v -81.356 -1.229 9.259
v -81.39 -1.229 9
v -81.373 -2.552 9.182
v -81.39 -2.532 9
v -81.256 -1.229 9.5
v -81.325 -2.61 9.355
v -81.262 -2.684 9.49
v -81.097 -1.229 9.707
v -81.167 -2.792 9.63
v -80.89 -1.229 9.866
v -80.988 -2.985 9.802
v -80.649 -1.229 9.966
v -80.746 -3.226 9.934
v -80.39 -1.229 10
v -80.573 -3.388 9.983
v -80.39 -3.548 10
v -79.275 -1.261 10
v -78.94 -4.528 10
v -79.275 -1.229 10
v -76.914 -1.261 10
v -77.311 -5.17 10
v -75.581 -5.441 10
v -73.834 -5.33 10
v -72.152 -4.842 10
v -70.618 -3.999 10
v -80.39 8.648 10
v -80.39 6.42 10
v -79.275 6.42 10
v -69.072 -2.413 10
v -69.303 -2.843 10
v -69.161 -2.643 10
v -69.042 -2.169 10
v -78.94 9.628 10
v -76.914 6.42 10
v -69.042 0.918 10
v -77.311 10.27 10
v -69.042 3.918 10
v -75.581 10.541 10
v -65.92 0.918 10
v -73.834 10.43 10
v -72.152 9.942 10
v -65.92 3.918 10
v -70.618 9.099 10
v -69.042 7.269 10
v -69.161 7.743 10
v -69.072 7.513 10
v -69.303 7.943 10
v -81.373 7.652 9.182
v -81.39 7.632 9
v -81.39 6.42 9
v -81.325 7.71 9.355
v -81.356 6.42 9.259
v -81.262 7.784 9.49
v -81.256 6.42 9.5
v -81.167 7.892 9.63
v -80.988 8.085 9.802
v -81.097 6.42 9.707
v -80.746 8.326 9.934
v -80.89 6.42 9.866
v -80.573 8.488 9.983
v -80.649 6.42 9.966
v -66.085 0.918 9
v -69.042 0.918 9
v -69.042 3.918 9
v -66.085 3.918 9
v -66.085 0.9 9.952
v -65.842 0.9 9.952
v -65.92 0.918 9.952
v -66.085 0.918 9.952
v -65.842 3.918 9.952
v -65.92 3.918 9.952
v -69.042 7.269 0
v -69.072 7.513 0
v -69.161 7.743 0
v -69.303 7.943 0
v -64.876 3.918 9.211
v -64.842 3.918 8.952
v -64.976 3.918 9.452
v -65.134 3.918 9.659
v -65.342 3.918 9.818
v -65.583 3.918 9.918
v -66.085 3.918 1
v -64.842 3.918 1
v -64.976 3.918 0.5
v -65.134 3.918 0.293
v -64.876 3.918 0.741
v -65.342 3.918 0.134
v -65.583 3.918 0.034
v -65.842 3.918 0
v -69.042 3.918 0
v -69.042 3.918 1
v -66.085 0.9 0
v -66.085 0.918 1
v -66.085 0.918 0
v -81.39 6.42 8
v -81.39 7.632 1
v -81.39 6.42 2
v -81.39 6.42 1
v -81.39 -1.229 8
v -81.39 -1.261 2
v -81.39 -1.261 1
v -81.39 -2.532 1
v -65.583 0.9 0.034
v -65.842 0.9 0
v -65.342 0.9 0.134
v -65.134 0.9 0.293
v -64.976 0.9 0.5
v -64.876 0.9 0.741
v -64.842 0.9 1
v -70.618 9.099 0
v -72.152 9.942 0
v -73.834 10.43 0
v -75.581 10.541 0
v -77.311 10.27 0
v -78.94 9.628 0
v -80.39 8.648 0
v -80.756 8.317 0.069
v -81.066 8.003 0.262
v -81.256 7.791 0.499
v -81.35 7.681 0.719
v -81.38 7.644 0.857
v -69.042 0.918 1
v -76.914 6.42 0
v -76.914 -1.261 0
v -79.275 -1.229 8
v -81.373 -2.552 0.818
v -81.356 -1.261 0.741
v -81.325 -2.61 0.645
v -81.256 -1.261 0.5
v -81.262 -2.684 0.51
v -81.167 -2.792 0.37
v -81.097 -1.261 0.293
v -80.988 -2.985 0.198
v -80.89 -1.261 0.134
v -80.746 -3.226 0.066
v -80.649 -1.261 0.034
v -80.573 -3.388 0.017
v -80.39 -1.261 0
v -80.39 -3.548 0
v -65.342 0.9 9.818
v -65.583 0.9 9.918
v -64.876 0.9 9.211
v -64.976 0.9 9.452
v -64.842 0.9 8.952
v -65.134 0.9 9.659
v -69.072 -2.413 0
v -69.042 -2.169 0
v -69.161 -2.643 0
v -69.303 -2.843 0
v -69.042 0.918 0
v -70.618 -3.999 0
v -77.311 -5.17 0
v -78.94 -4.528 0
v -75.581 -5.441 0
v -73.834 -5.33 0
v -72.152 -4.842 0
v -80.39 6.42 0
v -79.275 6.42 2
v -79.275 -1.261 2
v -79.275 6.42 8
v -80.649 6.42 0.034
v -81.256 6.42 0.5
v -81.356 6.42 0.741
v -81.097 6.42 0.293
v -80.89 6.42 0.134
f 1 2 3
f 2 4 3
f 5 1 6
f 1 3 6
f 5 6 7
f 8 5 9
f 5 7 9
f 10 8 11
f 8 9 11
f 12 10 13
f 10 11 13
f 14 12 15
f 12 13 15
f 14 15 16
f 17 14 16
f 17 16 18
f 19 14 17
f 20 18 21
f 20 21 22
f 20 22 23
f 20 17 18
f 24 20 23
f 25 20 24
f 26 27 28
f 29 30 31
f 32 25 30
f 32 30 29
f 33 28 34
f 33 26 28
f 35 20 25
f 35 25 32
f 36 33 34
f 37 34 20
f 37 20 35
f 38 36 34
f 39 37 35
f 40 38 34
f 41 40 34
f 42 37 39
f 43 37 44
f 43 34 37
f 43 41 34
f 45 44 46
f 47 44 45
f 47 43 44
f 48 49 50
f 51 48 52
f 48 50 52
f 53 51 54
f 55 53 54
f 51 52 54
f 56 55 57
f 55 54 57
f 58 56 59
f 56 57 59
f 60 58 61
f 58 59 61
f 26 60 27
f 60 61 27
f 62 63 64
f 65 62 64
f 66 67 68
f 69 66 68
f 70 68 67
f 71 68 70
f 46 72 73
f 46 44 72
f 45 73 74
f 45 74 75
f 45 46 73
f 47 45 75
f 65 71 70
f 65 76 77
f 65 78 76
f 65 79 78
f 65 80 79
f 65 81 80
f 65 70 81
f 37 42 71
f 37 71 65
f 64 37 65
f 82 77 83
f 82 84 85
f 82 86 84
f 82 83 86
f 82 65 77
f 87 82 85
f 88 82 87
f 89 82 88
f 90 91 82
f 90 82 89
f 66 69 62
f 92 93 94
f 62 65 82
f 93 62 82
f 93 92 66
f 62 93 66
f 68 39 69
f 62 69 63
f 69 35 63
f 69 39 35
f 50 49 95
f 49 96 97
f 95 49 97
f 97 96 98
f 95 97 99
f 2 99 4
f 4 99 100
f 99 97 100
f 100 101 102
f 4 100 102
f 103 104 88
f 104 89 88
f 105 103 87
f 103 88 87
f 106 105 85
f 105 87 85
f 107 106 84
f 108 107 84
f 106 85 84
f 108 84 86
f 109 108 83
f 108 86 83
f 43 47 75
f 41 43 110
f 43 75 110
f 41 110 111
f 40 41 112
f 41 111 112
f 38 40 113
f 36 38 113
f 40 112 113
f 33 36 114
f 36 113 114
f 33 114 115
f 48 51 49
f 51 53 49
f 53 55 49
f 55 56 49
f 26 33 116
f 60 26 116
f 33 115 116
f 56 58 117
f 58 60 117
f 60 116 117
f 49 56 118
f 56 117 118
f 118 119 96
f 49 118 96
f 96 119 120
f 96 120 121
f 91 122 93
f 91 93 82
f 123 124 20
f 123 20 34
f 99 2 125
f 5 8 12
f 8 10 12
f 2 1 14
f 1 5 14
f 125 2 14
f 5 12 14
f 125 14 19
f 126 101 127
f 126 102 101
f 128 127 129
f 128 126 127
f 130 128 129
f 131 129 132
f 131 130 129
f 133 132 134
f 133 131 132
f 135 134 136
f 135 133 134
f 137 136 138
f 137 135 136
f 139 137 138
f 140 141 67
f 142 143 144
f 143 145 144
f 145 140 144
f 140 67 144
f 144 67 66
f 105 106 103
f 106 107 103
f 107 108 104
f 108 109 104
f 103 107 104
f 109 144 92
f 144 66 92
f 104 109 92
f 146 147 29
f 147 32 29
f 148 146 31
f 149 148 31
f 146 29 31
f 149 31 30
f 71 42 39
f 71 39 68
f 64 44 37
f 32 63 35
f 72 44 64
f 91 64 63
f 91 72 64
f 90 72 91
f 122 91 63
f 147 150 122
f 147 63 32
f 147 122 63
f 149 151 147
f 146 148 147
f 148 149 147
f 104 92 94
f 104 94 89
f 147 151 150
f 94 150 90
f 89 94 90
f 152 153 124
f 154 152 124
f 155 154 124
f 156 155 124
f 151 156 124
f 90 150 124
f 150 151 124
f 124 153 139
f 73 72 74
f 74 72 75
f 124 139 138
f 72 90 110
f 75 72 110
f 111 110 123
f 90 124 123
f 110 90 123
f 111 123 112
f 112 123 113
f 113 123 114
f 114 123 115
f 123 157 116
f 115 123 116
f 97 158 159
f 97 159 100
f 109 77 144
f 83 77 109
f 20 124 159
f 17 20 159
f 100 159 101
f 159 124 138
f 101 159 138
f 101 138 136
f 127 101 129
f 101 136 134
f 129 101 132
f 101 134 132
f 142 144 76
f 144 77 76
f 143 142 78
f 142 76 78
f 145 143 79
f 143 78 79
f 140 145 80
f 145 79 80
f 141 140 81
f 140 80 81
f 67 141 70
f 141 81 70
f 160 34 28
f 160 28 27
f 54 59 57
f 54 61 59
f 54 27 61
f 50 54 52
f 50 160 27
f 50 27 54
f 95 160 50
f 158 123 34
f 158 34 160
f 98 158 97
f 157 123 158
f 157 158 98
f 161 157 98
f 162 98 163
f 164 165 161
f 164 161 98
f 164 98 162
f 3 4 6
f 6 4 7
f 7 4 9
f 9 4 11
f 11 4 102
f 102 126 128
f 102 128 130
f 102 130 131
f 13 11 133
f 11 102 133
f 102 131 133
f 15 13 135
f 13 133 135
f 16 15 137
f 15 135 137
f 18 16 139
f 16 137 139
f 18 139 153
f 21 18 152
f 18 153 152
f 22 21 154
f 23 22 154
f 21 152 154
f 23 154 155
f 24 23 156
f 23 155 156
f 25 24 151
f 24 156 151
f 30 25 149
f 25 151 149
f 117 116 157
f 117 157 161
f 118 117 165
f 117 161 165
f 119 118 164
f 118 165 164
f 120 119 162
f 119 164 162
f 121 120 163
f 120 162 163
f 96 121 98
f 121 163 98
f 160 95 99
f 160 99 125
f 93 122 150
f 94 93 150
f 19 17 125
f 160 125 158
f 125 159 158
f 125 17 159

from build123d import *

# Parameters (mm, degrees)
SKETCH_1_R            = 8
EXTRUDE_1_DEPTH       = 10
SKETCH_9_W            = 7.120641766
SKETCH_9_H            = 4.534999238
EXTRUDE_6_DEPTH       = 1
SKETCH_11_W           = 1.257653538
SKETCH_11_H           = 9
EXTRUDE_7_DEPTH       = 4.5
EXTRUDE_8_DEPTH       = 6
FILLET_8_R            = 1
FILLET_9_R            = 1
CUT_EXTRUDE_1_DEPTH   = 10
SKETCH_14_W           = 1
SKETCH_14_H           = 3
EXTRUDE_9_DEPTH       = 3.122043073
SKETCH_15_W           = 1
SKETCH_15_H           = 3
EXTRUDE_10_DEPTH      = 4
EXTRUDE_11_DEPTH      = 0.2
EXTRUDE_11_DEPTH_BACK = 1.043632387
SKETCH_16_W           = 9.952294967
SKETCH_16_H           = 3.01746433
FILLET_11_R           = 1
FILLET_12_R           = 1
FILLET_13_R           = 1
FILLET_14_R           = 1
CUT_EXTRUDE_2_DEPTH   = 10
SKETCH_18_W           = 2.361428176
SKETCH_18_H           = 7.68123899
CUT_EXTRUDE_3_DEPTH   = 10
SKETCH_19_W           = 2.115065294
SKETCH_19_H           = 7.68123899
CUT_EXTRUDE_4_DEPTH   = 2
SKETCH_20_W           = 2.115065294
SKETCH_20_H           = 7.649055087
CUT_EXTRUDE_5_DEPTH   = 2
FILLET_15_R           = 1
FILLET_16_R           = 1
FILLET_17_R           = 1
FILLET_18_R           = 1


with BuildPart() as part:
    # 草圖1 → 填料-伸長1 (new body)
    with BuildSketch(Plane(origin=(0.382706605, 0, 0), x_dir=(1, 0, 0), z_dir=(0, 0, 1))):
        with Locations((-75.594417438, 2.55)):
            Circle(SKETCH_1_R)
    extrude(amount=EXTRUDE_1_DEPTH)

    # 草圖9 → 填料-伸長6 (add)
    with BuildSketch(Plane(origin=(6.127831546, 0, 9), x_dir=(1, 0, 0), z_dir=(0, 0, 1))):
        with Locations((-75.644850643, 2.267499619)):
            Rectangle(SKETCH_9_W, SKETCH_9_H)
    extrude(amount=EXTRUDE_6_DEPTH)



with BuildPart() as body_2:
    # 草圖11 → 填料-伸長7 (new body)
    with BuildSketch(Plane(origin=(9.574526933, 4.534999238, 0.48426017), x_dir=(1, 0, 0), z_dir=(0, 1, 0))):
        with Locations((-76.184774061, -4.5)):
            Rectangle(SKETCH_11_W, SKETCH_11_H)
    extrude(amount=-EXTRUDE_7_DEPTH)


with BuildPart() as part_1:
    add(part.part)

    add(body_2.part)  # 填料-伸長8 merges body 2
    # 草圖12 → 填料-伸長8 (add)
    with BuildSketch(Plane.ZY.offset(67.239073897)):
        Polygon((0.48426017, 4.534999238), (0.48426017, 0), (1.483647509, 0.034999238), (1.483647509, 4.534999238), align=None)
    extrude(amount=EXTRUDE_8_DEPTH)

    # 圓角8
    fillet_8_edges = [part_1.edges().sort_by_distance(p)[0] for p in [
        (-65.981420359, 2.284999238, 0.48426017),
    ]]
    fillet(fillet_8_edges, radius=FILLET_8_R)

    # 圓角9
    fillet_9_edges = [part_1.edges().sort_by_distance(p)[0] for p in [
        (-65.956698214, 2.267499619, 10),
    ]]
    fillet(fillet_9_edges, radius=FILLET_9_R - 0.0001)  # a hair under: the kernel refuses the full size

    # 草圖13 → 除料-伸長1 (cut)
    with BuildSketch(Plane(origin=(0, 0, 0), x_dir=(-1, 0, 0), z_dir=(0, 0, -1))):
        with BuildLine():
            Line((69.041558468, 7.642074214), (69.041558468, -2.542074214))
            ThreePointArc((69.041558468, -2.542074214), (63.949484255, 2.55), (69.041558468, 7.642074214))
        make_face()
    extrude(amount=-CUT_EXTRUDE_1_DEPTH, mode=Mode.SUBTRACT)

    # 草圖14 → 填料-伸長9 (add)
    with BuildSketch(Plane(origin=(-69.041558468, 0, 0), x_dir=(0, 0, -1), z_dir=(1, 0, 0))):
        with Locations((-9.5, 2.417510407)):
            Rectangle(SKETCH_14_W, SKETCH_14_H)
    extrude(amount=EXTRUDE_9_DEPTH)

    # 草圖15 → 填料-伸長10 (add)
    with BuildSketch(Plane(origin=(-69.041558468, 0, 0), x_dir=(0, 0, -1), z_dir=(1, 0, 0))):
        with Locations((-0.5, 2.417510407)):
            Rectangle(SKETCH_15_W, SKETCH_15_H)
    extrude(amount=EXTRUDE_10_DEPTH)

    # 草圖16 → 填料-伸長11 (add, two sides: drawn at the far end of the back side and taken through both)
    with BuildSketch(Plane(origin=(-65.041558468, 0, 0), x_dir=(0, 0, -1), z_dir=(1, 0, 0)).offset(-EXTRUDE_11_DEPTH_BACK)):
        with Locations((-4.976147484, 2.408778242)):
            Rectangle(SKETCH_16_W, SKETCH_16_H)
    extrude(amount=EXTRUDE_11_DEPTH + EXTRUDE_11_DEPTH_BACK)

    # 圓角11
    fillet_11_edges = [part_1.edges().sort_by_distance(p)[0] for p in [
        (-64.841558468, 2.408778242, 0),
    ]]
    fillet(fillet_11_edges, radius=FILLET_11_R)

    # 圓角12
    fillet_12_edges = [part_1.edges().sort_by_distance(p)[0] for p in [
        (-64.841558468, 2.408778242, 9.952294967),
    ]]
    fillet(fillet_12_edges, radius=FILLET_12_R)

    # 圓角13
    fillet_13_edges = [part_1.edges().sort_by_distance(p)[0] for p in [
        (-69.041558468, 7.642074214, 5),
    ]]
    fillet(fillet_13_edges, radius=FILLET_13_R)

    # 圓角14
    fillet_14_edges = [part_1.edges().sort_by_distance(p)[0] for p in [
        (-69.041558468, -2.542074214, 5),
    ]]
    fillet(fillet_14_edges, radius=FILLET_14_R)

    # 草圖17 → 除料-伸長2 (cut)
    with BuildSketch(Plane(origin=(0, 0, 0), x_dir=(-1, 0, 0), z_dir=(0, 0, -1))):
        with BuildLine():
            Line((81.390220844, 7.631930149), (81.390220844, -2.531930149))
            ThreePointArc((81.390220844, -2.531930149), (84.200552216, 2.55), (81.390220844, 7.631930149))
        make_face()
    extrude(amount=-CUT_EXTRUDE_2_DEPTH, mode=Mode.SUBTRACT)

    # 草圖18 → 除料-伸長3 (cut)
    with BuildSketch(Plane(origin=(0, 0, 0), x_dir=(-1, 0, 0), z_dir=(0, 0, -1))):
        with Locations((78.094441462, 2.579171883)):
            Rectangle(SKETCH_18_W, SKETCH_18_H)
    extrude(amount=-CUT_EXTRUDE_3_DEPTH, mode=Mode.SUBTRACT)

    # 草圖19 → 除料-伸長4 (cut)
    with BuildSketch(Plane(origin=(0, 0, 0), x_dir=(-1, 0, 0), z_dir=(0, 0, -1))):
        with Locations((80.332688197, 2.579171883)):
            Rectangle(SKETCH_19_W, SKETCH_19_H)
    extrude(amount=-CUT_EXTRUDE_4_DEPTH, mode=Mode.SUBTRACT)

    # 草圖20 → 除料-伸長5 (cut)
    with BuildSketch(Plane.XY.offset(10)):
        with Locations((-80.332688197, 2.595263834)):
            Rectangle(SKETCH_20_W, SKETCH_20_H)
    extrude(amount=-CUT_EXTRUDE_5_DEPTH, mode=Mode.SUBTRACT)

    # 圓角15
    fillet_15_edges = [part_1.edges().sort_by_distance(p)[0] for p in [
        (-81.390220844, 7.025860764, 0),
    ]]
    fillet(fillet_15_edges, radius=FILLET_15_R)

    # 圓角16
    fillet_16_edges = [part_1.edges().sort_by_distance(p)[0] for p in [
        (-81.390220844, 7.025860764, 10),
    ]]
    fillet(fillet_16_edges, radius=FILLET_16_R)

    # 圓角17
    fillet_17_edges = [part_1.edges().sort_by_distance(p)[0] for p in [
        (-81.390220844, -1.89668888, 0),
    ]]
    fillet(fillet_17_edges, radius=FILLET_17_R)

    # 圓角18
    fillet_18_edges = [part_1.edges().sort_by_distance(p)[0] for p in [
        (-81.390220844, -1.880596929, 10),
    ]]
    fillet(fillet_18_edges, radius=FILLET_18_R)


solid = part_1.part
